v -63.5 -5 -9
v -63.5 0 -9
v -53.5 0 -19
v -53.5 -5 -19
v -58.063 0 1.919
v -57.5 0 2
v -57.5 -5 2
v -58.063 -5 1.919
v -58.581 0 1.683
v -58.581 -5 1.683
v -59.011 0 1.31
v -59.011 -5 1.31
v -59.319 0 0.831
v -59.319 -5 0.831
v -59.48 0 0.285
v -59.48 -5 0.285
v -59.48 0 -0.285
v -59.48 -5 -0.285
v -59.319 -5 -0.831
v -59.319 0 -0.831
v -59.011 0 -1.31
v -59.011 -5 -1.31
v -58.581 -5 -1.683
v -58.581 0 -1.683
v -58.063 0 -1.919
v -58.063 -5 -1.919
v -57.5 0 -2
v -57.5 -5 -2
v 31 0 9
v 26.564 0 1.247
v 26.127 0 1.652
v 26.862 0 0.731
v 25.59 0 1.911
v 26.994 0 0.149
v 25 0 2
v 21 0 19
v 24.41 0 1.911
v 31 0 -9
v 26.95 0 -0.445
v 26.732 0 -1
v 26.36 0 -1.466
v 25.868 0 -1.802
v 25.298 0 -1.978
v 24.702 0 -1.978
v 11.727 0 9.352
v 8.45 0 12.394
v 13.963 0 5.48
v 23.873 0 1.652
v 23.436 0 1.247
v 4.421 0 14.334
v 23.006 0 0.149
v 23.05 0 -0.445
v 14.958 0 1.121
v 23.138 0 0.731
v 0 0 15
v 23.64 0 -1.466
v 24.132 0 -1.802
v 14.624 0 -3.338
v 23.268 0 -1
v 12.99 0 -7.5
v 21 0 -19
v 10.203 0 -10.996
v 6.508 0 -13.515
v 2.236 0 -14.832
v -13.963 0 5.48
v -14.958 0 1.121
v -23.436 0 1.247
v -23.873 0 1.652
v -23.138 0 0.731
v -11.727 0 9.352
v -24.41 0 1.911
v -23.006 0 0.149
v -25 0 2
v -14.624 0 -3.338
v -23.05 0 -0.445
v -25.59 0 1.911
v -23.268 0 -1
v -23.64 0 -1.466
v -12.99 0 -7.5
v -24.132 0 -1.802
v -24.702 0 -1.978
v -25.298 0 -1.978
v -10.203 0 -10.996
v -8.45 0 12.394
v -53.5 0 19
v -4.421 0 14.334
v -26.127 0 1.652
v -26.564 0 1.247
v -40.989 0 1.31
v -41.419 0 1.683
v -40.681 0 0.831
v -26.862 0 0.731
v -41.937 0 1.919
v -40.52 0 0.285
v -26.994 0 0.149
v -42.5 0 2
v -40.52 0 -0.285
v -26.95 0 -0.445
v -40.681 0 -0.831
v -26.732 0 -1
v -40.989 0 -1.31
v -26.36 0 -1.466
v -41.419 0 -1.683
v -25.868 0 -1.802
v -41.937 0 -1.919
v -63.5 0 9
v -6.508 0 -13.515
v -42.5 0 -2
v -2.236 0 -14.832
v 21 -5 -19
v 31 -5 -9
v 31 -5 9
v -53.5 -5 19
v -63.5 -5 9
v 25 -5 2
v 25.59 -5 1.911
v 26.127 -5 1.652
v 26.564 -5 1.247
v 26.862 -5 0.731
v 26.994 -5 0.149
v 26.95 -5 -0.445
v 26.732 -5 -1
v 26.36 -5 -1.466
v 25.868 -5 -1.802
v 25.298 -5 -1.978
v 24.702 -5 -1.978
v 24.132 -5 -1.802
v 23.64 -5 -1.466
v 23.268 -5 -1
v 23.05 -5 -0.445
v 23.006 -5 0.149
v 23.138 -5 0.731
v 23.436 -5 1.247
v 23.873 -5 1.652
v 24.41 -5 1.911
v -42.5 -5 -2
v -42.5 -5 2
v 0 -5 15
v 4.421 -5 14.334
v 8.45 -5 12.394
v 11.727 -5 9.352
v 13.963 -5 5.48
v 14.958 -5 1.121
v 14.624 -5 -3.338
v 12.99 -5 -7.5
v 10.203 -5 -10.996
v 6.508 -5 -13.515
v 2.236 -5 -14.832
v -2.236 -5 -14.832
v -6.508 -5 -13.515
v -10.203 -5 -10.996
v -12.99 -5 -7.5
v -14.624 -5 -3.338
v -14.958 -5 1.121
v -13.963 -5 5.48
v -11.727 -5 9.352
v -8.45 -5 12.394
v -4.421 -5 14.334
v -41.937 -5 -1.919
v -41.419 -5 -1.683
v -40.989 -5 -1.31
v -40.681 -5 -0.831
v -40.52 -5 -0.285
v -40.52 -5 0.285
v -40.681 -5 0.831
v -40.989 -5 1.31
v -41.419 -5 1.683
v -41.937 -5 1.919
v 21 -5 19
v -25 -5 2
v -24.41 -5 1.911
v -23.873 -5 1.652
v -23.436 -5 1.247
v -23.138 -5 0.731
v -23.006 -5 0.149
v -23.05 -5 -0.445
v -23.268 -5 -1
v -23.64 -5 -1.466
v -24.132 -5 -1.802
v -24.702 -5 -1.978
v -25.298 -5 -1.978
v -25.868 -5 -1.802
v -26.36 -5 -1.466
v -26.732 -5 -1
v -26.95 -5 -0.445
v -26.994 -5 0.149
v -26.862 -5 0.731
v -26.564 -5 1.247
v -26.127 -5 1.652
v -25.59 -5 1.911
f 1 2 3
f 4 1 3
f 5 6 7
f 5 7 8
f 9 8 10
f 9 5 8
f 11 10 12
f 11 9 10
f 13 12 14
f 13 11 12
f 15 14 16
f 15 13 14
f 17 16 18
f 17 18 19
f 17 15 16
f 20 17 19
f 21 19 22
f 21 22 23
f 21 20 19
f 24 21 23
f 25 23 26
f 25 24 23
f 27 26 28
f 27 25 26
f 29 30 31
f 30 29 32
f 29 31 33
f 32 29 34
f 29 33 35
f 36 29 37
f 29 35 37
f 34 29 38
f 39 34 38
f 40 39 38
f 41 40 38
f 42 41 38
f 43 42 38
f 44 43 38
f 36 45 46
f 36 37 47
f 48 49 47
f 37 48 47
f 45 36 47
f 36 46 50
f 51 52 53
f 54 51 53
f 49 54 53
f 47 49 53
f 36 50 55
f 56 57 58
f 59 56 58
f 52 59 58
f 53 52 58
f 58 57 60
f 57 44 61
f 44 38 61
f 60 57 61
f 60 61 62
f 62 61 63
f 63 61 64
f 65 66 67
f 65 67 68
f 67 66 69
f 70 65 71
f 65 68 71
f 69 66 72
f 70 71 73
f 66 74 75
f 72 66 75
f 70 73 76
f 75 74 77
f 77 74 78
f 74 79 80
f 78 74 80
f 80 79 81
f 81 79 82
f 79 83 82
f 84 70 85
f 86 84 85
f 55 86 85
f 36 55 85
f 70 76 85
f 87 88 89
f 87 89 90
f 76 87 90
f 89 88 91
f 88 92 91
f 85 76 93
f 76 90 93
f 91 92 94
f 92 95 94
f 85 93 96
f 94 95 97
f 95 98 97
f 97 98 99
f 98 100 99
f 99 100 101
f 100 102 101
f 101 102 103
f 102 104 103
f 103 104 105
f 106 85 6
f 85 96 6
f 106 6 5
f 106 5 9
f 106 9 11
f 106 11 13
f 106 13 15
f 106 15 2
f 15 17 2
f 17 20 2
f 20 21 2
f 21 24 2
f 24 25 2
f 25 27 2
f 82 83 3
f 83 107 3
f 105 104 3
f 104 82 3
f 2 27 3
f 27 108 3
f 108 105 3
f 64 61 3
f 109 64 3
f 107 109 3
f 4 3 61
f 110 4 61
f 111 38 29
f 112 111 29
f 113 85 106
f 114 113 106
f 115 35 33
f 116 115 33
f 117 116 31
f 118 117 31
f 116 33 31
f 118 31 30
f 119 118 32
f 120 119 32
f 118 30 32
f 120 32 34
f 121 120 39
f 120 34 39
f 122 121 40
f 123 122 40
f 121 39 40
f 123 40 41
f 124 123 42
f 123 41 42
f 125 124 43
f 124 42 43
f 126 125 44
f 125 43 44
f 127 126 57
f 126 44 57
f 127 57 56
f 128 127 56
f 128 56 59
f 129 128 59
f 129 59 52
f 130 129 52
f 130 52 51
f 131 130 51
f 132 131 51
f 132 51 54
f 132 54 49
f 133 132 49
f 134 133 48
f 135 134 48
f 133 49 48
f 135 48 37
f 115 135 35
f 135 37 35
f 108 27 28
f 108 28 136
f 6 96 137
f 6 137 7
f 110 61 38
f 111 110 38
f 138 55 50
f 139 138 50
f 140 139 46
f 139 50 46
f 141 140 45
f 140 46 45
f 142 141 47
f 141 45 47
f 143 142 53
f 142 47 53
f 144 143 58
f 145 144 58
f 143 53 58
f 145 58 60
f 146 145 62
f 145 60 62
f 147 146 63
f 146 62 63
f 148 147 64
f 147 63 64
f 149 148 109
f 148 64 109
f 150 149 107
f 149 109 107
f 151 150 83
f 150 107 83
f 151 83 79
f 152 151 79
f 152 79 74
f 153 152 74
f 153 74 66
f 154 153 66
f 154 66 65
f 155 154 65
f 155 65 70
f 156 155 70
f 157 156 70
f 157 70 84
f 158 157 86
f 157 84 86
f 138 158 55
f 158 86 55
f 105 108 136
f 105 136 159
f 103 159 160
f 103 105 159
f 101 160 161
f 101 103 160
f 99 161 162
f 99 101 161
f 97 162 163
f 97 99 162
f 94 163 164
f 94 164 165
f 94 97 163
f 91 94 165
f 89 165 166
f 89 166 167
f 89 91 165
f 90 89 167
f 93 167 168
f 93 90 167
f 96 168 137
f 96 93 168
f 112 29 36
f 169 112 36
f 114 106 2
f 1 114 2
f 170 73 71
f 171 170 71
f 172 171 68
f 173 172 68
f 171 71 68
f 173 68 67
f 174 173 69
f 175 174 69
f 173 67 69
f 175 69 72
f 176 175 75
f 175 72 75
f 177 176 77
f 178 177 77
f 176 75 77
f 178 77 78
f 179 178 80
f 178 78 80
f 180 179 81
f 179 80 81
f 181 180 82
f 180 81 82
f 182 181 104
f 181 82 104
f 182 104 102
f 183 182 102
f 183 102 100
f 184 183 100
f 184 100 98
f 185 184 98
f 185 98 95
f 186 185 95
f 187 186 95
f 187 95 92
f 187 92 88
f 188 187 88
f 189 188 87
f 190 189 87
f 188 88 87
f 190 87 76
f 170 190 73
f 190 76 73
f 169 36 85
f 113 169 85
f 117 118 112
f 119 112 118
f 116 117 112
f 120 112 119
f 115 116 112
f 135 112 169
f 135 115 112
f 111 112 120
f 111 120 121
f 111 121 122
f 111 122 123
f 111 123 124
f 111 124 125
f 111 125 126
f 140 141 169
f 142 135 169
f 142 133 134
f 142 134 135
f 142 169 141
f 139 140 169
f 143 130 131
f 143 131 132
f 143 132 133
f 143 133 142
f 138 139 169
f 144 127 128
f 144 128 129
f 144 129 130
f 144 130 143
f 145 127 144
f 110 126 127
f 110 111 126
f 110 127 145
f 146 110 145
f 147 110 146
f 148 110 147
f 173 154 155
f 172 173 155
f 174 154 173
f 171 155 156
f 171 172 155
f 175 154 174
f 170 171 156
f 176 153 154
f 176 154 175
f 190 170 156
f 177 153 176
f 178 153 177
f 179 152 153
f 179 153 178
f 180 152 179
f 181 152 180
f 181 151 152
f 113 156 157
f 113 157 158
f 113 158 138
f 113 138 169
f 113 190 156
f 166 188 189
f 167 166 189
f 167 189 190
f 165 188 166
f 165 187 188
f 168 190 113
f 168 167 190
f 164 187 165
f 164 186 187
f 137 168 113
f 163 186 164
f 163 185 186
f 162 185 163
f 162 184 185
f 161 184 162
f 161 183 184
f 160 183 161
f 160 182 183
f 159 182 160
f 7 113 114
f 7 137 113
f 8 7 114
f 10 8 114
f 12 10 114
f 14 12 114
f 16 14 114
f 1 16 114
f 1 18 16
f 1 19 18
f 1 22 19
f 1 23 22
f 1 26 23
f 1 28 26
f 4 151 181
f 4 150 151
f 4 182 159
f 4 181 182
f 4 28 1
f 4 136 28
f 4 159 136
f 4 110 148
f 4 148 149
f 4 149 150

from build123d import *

# Parameters (mm, degrees)
SKETCH1_R           = 2
SKETCH1_R_2         = 15
BOSS_EXTRUDE1_DEPTH = 5


with BuildPart() as part:
    # Sketch1 → Boss-Extrude1 (new body)
    with BuildSketch(Plane(origin=(0, 0, 0), x_dir=(1, 0, 0), z_dir=(0, 1, 0))):
        Polygon((-63.5, 9), (-53.5, 19), (21, 19), (31, 9), (31, -9), (21, -19), (-53.5, -19), (-63.5, -9), align=None)
        with Locations(Location((-25, 0, 0), (0, 0, 270))):
            Circle(SKETCH1_R, mode=Mode.SUBTRACT)
        with Locations(Location((25, 0, 0), (0, 0, 270))):
            Circle(SKETCH1_R, mode=Mode.SUBTRACT)
        with Locations(Location((0, 0, 0), (0, 0, 270))):
            Circle(SKETCH1_R_2, mode=Mode.SUBTRACT)
        with BuildLine():
            Line((-57.5, 2), (-42.5, 2))
            ThreePointArc((-42.5, 2), (-40.5, 0), (-42.5, -2))
            Line((-42.5, -2), (-57.5, -2))
            ThreePointArc((-57.5, -2), (-59.5, 0), (-57.5, 2))
        make_face(mode=Mode.SUBTRACT)
    extrude(amount=-BOSS_EXTRUDE1_DEPTH)


solid = part.part
